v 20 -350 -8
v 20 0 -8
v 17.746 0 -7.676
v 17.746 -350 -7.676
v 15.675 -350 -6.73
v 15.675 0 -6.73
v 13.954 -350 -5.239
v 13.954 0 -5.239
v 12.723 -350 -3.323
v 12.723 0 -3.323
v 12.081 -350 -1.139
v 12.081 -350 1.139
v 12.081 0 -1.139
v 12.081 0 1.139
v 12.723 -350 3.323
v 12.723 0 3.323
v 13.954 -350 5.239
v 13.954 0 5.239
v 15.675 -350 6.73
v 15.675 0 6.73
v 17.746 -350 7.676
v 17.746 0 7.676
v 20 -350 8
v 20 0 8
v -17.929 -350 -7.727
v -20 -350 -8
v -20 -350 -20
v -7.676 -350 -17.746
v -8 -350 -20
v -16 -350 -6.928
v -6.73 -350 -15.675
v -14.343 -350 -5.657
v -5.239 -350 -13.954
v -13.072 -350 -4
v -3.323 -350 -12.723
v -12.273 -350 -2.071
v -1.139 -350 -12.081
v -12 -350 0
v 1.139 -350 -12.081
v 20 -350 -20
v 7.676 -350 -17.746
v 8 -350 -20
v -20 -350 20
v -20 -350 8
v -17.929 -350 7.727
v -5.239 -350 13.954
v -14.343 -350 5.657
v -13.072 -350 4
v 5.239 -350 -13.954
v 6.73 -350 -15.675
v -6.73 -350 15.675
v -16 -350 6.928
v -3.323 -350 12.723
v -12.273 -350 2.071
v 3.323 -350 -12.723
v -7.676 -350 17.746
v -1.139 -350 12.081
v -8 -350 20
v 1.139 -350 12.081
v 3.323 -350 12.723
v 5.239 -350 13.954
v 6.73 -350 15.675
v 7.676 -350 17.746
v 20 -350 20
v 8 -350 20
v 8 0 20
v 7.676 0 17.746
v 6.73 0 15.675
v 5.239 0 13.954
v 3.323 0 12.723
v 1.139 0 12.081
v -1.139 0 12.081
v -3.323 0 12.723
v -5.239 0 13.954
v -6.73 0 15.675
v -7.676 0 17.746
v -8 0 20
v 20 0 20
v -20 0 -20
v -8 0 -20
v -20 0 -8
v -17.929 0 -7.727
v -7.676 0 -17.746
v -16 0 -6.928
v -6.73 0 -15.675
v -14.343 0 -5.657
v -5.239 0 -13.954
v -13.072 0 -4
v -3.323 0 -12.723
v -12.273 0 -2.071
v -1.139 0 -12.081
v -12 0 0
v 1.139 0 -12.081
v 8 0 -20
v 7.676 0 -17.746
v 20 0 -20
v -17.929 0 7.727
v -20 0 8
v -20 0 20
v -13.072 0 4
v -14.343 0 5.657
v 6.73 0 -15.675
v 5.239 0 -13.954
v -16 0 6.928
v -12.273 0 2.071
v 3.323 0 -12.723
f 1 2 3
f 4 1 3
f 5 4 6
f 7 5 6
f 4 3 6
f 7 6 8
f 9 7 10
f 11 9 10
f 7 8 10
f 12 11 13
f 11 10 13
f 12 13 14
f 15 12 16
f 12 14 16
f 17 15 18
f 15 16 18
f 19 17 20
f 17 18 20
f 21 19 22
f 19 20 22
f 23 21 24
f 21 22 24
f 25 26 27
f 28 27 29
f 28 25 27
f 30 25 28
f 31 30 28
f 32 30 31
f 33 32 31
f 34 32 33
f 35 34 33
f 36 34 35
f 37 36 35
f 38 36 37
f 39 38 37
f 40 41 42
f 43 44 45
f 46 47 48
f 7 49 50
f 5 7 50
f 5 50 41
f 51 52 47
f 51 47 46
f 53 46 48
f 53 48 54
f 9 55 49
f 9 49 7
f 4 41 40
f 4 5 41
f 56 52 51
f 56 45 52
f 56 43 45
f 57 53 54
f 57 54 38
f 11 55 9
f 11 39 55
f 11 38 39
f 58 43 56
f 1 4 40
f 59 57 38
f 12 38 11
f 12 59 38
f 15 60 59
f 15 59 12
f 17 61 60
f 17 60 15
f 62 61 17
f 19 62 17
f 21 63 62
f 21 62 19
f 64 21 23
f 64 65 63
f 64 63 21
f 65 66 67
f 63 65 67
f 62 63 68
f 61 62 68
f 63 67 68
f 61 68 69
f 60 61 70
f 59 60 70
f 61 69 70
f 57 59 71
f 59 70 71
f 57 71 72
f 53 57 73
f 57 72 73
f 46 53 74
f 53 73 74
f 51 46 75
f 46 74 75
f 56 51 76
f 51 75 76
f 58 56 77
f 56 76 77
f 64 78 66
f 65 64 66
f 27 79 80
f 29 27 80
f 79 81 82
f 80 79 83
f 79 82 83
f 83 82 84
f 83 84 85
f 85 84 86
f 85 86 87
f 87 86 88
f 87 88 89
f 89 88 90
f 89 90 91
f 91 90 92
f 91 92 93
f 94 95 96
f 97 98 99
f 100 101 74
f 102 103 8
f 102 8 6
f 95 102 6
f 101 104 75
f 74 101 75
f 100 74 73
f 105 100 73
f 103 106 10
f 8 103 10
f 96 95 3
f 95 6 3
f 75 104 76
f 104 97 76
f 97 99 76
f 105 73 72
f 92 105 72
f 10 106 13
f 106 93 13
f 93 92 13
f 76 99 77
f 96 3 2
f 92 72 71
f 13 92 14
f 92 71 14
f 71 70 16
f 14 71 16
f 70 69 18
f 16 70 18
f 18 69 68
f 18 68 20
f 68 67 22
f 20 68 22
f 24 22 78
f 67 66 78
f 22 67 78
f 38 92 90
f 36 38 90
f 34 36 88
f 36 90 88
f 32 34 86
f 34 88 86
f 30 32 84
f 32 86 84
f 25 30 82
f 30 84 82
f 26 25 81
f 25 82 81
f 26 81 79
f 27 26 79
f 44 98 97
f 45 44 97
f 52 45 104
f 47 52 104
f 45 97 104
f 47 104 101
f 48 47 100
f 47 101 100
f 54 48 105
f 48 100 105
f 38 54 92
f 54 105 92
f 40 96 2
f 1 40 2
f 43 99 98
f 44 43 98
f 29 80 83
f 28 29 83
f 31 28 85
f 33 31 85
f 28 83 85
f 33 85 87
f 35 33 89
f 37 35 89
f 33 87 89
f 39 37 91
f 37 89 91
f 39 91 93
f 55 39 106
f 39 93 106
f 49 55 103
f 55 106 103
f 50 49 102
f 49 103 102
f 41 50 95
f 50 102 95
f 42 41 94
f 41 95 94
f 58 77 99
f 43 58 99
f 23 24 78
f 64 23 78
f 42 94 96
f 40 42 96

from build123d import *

# Parameters (mm, degrees)
F1_DEPTH = 350


with BuildPart() as f1:
    # F0 (on Front) → F1 (new body)
    with BuildSketch(Plane.XZ):
        with BuildLine():
            Line((8, -20), (20, -20))
            Line((20, -20), (20, -8))
            ThreePointArc((20, -8), (12, 0), (20, 8))
            Line((20, 8), (20, 20))
            Line((20, 20), (8, 20))
            ThreePointArc((8, 20), (0, 12), (-8, 20))
            Line((-8, 20), (-20, 20))
            Line((-20, 20), (-20, 8))
            ThreePointArc((-20, 8), (-14.343146, 5.656854), (-12, 0))
            ThreePointArc((-12, 0), (-14.343146, -5.656854), (-20, -8))
            Line((-20, -8), (-20, -20))
            Line((-20, -20), (-8, -20))
            ThreePointArc((-8, -20), (0, -12), (8, -20))
        make_face()
    extrude(amount=F1_DEPTH)


solid = f1.part
